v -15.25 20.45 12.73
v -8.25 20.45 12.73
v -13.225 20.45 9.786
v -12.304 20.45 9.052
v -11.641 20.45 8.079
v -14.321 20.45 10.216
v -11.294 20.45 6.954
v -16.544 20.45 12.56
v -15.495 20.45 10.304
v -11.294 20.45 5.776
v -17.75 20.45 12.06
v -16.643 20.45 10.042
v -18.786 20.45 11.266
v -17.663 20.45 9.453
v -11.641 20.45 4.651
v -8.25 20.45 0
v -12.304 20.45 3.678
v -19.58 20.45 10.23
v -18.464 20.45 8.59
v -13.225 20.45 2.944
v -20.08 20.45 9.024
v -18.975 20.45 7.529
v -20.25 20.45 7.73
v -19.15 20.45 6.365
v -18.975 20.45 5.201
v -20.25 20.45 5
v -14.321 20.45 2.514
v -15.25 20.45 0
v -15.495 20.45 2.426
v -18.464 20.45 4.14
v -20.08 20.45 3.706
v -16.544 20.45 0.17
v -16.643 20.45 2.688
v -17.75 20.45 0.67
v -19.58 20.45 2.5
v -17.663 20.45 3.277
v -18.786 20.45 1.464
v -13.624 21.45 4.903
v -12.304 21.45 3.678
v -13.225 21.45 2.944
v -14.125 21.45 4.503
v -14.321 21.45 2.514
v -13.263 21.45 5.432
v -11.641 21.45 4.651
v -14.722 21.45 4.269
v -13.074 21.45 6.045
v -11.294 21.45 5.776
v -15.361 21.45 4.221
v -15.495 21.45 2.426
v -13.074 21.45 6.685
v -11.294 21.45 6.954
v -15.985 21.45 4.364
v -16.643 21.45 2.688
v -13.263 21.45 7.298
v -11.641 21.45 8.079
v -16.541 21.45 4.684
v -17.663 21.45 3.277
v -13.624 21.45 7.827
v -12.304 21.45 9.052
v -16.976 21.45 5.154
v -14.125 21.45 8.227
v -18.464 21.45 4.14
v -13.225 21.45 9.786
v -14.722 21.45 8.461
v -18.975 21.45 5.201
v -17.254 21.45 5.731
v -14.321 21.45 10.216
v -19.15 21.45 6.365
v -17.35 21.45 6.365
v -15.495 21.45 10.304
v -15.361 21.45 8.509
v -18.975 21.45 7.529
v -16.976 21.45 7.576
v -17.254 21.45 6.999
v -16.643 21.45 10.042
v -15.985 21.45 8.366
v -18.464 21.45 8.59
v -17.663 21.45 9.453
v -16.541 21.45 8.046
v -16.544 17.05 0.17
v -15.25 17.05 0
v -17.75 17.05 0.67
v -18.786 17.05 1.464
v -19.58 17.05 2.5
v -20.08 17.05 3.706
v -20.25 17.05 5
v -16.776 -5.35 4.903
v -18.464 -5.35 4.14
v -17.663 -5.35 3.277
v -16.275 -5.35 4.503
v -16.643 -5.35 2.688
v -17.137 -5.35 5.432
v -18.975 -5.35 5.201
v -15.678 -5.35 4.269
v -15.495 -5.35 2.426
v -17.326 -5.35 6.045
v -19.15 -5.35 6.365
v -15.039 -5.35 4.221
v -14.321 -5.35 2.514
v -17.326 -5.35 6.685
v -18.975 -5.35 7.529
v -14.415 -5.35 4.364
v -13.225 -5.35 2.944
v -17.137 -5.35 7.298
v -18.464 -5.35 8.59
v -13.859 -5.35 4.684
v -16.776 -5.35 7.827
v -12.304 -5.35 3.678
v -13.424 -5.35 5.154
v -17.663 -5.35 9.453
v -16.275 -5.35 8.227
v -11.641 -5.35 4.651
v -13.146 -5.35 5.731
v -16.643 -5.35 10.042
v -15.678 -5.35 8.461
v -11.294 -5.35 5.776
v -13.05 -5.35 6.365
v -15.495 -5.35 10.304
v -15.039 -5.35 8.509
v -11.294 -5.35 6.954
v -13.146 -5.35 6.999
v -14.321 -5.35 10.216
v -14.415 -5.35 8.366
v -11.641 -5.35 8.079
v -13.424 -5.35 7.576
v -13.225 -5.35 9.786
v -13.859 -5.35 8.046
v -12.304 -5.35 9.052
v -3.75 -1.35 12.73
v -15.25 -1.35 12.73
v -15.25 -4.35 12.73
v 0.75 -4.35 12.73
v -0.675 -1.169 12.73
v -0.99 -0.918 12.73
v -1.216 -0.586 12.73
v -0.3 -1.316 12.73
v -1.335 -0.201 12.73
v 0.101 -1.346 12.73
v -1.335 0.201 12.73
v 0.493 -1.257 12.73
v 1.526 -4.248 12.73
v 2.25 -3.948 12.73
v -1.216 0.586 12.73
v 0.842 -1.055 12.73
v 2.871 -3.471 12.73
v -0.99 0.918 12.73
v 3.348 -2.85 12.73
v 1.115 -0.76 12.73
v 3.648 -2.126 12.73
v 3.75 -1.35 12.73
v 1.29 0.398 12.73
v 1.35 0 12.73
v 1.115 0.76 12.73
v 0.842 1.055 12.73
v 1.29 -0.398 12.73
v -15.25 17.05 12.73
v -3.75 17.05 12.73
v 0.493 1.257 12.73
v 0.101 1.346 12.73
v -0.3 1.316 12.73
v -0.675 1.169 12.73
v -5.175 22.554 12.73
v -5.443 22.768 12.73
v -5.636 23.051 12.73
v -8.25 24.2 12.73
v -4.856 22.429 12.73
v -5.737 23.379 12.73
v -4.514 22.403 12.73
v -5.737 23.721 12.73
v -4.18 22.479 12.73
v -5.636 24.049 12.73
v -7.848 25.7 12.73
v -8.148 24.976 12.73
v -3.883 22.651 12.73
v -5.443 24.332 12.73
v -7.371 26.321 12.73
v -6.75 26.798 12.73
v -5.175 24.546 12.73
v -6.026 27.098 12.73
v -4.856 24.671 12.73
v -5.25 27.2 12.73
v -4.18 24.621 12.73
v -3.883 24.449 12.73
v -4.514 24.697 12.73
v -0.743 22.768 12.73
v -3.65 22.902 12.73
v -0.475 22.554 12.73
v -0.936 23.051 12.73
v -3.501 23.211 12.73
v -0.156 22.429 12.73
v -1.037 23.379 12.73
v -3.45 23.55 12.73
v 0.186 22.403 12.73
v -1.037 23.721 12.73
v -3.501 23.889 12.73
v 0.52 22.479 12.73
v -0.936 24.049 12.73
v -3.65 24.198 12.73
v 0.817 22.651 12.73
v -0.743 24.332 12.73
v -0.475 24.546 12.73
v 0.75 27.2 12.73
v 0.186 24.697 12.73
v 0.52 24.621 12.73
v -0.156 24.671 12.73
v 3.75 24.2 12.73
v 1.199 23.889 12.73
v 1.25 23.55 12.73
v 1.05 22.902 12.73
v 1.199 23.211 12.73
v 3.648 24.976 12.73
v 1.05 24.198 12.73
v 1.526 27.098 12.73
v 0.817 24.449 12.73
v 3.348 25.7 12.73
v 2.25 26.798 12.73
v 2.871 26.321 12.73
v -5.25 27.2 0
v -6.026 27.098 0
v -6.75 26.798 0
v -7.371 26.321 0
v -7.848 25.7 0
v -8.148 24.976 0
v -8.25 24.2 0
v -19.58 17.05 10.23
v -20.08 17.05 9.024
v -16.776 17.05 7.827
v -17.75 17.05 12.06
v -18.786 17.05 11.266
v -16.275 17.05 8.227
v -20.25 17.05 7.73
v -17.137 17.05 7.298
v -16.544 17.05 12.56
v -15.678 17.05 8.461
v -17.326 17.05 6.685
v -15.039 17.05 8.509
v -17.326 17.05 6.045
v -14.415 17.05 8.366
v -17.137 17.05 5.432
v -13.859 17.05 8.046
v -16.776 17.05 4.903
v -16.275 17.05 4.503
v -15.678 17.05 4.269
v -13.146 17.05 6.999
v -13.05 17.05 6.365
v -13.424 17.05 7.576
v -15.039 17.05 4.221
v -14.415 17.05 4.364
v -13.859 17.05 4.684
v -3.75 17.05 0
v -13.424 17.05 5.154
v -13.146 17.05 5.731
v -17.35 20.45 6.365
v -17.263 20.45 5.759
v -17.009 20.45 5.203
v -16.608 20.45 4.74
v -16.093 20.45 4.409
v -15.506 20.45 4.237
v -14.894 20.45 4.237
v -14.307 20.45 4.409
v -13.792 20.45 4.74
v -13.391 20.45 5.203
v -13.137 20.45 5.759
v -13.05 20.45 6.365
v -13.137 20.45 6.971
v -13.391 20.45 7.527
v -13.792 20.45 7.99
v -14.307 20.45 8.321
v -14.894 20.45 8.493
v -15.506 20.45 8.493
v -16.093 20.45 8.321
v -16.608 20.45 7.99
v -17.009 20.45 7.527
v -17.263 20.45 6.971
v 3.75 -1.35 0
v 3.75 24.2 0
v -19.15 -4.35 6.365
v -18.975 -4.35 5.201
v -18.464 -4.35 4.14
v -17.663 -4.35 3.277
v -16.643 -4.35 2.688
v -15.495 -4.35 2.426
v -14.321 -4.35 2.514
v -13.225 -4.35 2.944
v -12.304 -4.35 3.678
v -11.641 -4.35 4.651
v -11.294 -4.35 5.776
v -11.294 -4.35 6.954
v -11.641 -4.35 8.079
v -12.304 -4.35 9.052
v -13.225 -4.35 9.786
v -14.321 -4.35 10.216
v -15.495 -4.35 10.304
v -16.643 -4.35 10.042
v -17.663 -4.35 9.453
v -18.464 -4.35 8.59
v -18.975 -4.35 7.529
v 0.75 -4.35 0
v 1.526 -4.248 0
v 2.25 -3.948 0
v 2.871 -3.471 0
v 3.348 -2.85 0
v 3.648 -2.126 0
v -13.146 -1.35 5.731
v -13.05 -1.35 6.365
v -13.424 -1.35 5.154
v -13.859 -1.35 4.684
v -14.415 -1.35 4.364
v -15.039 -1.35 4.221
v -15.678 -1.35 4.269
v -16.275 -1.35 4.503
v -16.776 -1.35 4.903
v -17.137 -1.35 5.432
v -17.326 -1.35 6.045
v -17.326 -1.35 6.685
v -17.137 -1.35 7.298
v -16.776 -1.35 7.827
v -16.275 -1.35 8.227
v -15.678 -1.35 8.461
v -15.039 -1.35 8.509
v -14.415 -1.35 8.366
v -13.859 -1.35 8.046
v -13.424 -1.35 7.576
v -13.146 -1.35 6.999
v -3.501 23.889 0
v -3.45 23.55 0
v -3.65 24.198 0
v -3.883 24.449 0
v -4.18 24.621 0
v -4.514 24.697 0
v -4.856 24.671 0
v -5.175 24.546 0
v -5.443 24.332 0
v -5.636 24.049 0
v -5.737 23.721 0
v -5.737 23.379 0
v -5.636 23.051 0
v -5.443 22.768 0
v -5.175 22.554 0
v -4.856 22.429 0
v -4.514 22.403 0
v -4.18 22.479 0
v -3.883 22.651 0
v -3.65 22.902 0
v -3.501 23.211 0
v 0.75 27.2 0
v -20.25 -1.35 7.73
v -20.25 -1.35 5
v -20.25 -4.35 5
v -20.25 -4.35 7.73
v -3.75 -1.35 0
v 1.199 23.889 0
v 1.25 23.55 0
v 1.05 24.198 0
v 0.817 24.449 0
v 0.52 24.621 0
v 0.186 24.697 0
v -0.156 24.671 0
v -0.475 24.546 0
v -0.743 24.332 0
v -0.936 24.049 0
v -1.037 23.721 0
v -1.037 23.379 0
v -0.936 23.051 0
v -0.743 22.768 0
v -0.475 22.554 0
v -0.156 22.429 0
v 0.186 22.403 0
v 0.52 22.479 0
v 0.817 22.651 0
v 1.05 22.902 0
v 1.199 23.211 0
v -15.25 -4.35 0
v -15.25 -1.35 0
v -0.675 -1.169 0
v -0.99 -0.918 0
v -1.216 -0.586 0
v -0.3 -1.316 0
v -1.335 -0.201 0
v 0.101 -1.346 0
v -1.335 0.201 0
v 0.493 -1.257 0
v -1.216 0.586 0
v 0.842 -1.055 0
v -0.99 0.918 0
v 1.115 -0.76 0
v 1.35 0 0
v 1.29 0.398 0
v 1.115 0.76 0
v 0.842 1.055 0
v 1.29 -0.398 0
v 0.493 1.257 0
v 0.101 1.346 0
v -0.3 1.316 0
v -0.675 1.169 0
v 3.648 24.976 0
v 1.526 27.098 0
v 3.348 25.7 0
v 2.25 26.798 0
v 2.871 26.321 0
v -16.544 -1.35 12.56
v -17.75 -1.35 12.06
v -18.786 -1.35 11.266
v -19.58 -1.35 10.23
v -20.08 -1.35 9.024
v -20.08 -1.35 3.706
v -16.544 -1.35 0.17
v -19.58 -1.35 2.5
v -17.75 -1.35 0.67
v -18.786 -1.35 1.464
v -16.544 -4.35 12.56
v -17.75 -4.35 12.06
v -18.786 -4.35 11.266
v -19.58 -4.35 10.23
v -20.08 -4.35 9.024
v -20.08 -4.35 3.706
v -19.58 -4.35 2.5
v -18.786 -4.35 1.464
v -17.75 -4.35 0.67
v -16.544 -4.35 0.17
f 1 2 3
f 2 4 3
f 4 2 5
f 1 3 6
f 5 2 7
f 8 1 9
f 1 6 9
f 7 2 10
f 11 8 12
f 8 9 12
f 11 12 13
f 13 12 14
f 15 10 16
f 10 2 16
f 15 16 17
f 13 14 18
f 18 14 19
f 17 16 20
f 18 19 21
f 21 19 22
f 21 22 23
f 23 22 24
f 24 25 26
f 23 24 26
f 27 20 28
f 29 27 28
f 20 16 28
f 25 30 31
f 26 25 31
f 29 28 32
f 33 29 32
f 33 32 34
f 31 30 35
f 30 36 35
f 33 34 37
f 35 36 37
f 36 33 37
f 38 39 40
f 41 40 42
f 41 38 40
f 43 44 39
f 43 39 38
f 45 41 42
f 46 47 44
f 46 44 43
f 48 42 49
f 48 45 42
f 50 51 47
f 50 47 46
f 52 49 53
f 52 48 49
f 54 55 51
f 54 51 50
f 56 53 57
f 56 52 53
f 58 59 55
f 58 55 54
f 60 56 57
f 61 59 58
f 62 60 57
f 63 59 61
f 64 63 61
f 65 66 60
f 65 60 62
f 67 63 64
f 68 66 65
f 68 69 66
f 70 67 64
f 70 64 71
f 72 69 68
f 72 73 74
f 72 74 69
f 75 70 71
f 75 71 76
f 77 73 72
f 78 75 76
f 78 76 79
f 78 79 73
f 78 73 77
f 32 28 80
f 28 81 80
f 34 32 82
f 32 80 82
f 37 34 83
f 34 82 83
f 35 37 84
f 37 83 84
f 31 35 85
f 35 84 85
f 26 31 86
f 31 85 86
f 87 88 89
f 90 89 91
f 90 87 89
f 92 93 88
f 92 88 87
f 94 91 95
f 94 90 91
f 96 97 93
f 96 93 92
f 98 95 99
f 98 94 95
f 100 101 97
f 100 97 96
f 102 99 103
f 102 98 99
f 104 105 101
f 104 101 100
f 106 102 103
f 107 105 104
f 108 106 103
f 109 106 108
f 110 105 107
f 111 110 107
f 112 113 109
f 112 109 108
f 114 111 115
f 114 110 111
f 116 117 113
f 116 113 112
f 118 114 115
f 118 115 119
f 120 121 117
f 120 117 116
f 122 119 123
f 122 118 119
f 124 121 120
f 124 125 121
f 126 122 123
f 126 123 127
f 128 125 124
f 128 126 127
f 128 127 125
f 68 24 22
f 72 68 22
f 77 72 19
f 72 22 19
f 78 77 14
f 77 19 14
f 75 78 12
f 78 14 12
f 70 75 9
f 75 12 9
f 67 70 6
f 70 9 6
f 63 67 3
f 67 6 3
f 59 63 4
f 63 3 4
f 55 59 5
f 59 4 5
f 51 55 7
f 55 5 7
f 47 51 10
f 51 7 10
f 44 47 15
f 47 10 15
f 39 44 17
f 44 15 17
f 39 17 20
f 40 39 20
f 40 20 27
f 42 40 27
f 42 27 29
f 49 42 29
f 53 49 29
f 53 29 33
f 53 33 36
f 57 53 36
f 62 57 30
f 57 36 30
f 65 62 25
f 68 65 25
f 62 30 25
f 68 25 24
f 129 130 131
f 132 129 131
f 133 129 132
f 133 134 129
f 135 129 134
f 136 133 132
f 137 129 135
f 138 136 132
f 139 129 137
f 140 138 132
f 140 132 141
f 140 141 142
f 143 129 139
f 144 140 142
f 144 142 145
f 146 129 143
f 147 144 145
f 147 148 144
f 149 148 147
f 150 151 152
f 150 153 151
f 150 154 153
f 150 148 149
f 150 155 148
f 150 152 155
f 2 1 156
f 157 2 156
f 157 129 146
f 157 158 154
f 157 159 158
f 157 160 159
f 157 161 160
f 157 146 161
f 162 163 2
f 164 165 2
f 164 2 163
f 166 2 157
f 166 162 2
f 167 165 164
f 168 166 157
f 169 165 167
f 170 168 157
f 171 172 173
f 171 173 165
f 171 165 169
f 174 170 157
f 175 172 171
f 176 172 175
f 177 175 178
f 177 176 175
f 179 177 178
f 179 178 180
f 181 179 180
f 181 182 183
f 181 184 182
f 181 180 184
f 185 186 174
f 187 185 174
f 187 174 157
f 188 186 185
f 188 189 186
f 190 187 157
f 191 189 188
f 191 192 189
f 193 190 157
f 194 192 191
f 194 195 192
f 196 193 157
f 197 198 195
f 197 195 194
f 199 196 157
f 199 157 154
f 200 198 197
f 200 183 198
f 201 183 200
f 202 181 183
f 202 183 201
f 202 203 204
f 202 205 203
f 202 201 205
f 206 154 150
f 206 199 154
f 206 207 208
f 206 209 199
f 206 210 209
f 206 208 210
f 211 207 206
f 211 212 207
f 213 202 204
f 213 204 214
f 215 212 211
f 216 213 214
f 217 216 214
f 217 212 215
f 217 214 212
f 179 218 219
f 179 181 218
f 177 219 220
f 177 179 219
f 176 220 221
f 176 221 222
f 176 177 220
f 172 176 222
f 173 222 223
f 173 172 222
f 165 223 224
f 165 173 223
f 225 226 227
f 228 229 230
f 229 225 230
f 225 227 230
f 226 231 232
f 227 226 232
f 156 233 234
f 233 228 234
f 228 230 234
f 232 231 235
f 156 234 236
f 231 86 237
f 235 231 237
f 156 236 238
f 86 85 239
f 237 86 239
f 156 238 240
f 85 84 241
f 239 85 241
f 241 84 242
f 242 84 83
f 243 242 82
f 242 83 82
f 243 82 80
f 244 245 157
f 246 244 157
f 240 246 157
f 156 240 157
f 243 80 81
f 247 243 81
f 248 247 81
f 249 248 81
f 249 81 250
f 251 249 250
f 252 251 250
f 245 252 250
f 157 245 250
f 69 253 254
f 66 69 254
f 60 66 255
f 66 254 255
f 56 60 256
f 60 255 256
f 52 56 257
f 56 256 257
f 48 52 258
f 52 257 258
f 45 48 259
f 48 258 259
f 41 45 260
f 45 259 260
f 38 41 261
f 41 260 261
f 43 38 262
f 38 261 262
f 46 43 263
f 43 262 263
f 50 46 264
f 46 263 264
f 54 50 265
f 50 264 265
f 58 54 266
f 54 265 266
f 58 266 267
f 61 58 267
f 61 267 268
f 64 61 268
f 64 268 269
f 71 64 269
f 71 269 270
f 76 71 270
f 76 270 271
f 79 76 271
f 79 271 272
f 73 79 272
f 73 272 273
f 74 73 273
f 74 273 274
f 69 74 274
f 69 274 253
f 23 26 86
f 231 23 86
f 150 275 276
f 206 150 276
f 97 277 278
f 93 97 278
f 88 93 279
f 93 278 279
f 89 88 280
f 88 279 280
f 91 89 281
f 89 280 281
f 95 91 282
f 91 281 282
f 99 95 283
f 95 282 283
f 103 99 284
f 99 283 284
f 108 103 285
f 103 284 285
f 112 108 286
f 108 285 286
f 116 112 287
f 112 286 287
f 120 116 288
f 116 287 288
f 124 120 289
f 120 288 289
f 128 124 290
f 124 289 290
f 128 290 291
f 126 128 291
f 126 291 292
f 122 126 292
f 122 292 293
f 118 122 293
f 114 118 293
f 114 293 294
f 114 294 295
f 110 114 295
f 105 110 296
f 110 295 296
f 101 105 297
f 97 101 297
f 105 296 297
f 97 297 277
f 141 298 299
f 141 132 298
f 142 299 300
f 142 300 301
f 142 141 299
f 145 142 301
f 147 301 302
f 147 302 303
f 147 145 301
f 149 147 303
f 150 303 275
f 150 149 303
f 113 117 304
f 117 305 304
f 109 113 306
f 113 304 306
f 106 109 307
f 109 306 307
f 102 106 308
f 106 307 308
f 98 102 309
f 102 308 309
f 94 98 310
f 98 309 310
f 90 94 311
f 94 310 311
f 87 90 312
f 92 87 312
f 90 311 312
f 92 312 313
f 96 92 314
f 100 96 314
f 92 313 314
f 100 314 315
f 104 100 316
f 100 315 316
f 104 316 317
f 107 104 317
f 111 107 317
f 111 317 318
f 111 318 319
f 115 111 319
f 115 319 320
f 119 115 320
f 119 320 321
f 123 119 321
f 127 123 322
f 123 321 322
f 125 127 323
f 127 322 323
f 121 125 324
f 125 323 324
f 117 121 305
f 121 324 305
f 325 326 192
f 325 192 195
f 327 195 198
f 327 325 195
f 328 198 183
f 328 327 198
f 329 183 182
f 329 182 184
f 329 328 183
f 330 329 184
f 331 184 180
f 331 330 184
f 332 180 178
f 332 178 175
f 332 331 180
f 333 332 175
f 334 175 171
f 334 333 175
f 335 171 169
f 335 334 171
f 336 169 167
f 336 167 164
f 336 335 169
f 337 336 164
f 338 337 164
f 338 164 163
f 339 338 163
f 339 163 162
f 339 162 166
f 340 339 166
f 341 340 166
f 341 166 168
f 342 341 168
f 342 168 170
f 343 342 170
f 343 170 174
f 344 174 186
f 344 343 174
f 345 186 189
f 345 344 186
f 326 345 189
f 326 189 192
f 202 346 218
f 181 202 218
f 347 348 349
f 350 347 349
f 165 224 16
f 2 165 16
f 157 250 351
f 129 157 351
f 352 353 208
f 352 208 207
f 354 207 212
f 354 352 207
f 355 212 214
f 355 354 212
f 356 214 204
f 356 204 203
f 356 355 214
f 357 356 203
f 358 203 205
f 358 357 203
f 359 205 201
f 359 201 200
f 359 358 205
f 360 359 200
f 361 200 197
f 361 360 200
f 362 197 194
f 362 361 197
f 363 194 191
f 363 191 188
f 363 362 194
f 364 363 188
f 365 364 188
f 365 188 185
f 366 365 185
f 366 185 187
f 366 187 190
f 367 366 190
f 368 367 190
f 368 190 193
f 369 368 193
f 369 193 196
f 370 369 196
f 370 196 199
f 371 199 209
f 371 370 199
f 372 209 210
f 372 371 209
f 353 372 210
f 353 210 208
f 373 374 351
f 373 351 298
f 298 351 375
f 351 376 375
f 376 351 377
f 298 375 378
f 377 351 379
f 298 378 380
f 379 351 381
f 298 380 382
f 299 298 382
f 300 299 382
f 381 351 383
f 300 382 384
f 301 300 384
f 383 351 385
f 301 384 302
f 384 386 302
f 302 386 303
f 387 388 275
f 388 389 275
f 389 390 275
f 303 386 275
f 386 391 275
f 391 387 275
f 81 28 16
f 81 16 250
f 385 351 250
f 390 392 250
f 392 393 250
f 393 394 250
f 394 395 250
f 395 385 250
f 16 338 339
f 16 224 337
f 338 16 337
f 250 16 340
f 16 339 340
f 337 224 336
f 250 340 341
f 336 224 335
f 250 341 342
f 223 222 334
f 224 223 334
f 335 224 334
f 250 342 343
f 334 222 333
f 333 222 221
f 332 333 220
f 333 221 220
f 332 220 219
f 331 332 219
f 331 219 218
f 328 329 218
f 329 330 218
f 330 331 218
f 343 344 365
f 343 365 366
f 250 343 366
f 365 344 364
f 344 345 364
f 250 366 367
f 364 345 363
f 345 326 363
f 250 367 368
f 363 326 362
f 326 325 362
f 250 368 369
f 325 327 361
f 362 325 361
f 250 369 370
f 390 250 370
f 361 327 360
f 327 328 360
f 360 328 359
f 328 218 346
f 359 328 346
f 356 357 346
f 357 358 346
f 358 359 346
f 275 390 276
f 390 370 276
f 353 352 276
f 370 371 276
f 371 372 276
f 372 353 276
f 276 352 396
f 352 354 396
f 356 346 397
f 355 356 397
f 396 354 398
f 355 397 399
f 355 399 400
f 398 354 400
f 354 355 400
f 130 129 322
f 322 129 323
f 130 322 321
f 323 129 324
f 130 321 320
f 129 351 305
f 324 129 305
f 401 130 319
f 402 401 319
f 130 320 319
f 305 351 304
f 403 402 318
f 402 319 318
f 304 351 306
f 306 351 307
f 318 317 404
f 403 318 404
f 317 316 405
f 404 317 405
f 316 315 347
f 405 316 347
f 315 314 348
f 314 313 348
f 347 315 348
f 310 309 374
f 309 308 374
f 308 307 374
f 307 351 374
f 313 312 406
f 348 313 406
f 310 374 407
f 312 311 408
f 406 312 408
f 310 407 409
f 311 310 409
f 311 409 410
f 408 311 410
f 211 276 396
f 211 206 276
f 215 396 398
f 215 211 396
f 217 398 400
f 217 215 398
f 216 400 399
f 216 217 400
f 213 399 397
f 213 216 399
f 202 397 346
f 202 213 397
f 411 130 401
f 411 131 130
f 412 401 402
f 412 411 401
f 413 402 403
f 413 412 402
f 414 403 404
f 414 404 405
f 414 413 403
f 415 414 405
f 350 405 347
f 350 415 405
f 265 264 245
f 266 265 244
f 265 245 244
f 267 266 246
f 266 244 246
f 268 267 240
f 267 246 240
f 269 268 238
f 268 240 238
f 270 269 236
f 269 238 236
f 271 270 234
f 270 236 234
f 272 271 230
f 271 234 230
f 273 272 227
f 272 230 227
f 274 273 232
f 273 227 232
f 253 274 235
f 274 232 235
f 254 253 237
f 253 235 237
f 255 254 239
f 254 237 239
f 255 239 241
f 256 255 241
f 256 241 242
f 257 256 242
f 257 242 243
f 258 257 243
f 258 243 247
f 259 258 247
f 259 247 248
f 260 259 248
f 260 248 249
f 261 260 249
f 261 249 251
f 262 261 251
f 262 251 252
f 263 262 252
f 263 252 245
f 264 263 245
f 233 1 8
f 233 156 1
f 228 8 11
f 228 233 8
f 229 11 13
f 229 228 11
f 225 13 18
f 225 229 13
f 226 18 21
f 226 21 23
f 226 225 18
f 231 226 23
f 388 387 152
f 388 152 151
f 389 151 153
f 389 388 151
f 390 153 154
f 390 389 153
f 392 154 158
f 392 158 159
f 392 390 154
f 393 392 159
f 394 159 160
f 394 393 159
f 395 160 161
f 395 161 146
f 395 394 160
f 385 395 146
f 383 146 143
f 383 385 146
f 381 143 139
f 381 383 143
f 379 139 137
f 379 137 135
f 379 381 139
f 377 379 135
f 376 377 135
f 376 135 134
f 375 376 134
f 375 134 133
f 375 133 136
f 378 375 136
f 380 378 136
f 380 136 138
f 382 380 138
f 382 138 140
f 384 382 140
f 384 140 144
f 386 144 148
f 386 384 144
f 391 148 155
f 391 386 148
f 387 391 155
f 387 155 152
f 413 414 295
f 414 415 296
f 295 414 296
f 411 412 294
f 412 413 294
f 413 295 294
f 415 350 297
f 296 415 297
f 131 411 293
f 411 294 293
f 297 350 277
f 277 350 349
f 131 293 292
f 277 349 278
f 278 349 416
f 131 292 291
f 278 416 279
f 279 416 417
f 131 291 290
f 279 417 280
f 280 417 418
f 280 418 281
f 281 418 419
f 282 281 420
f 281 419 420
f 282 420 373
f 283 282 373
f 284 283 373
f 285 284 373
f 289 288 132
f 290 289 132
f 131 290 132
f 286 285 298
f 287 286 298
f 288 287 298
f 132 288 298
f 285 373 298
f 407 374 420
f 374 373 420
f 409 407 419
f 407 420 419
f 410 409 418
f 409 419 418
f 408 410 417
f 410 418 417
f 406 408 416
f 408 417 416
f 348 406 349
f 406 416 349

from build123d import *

# Parameters (mm, degrees)
F0_R     = 1.35
F0_R_2   = 1.15
F1_DEPTH = 12.73
F3_DEPTH = 25
F4_R     = 5
F5_R     = 3
F6_R     = 3
F7_DEPTH = 1
F8_R     = 3.95
F9_DEPTH = 1


with BuildPart() as f1:
    # F0 (on Top) → F1 (new body)
    with BuildSketch(Plane.XY):
        Polygon((3.75, -4.35), (3.75, 0), (3.75, 27.2), (-8.25, 27.2), (-8.25, 20.45), (-20.25, 20.45), (-20.25, 17.05), (-3.75, 17.05), (-3.75, -1.35), (-20.25, -1.35), (-20.25, -4.35), align=None)
        Circle(F0_R, mode=Mode.SUBTRACT)
        with Locations((-4.6, 23.55)):
            Circle(F0_R_2, mode=Mode.SUBTRACT)
        with Locations((0.1, 23.55)):
            Circle(F0_R_2, mode=Mode.SUBTRACT)
    extrude(amount=F1_DEPTH)

    # F2 (on face) → F3 (cut)
    with BuildSketch(Plane.XZ.offset(4.35)):
        with BuildLine():
            ThreePointArc((-17.35, 6.365), (-15.2, 4.215), (-13.05, 6.365))
            ThreePointArc((-13.05, 6.365), (-15.2, 8.515), (-17.35, 6.365))
        make_face()
    extrude(amount=-F3_DEPTH, mode=Mode.SUBTRACT)

    # F4
    f4_edges = [f1.edges().sort_by_distance(p)[0] for p in [
        (-20.25, -2.85, 12.73),
        (-20.25, 18.75, 12.73),
        (-20.25, -2.85, 0),
        (-20.25, 18.75, 0),
    ]]
    fillet(f4_edges, radius=F4_R)

    # F5
    f5_edges = [f1.edges().sort_by_distance(p)[0] for p in [
        (3.75, -4.35, 6.365),
    ]]
    fillet(f5_edges, radius=F5_R)

    # F6
    f6_edges = [f1.edges().sort_by_distance(p)[0] for p in [
        (-8.25, 27.2, 6.365),
        (3.75, 27.2, 6.365),
    ]]
    fillet(f6_edges, radius=F6_R)

    # F2 (on face) → F7 (join)
    with BuildSketch(Plane.XZ.offset(4.35)):
        with BuildLine():
            ThreePointArc((-11.25, 6.365), (-15.2, 10.315), (-19.15, 6.365))
            ThreePointArc((-19.15, 6.365), (-15.2, 2.415), (-11.25, 6.365))
        make_face()
        with BuildLine():
            ThreePointArc((-17.35, 6.365), (-15.2, 8.515), (-13.05, 6.365))
            ThreePointArc((-13.05, 6.365), (-15.2, 4.215), (-17.35, 6.365))
        make_face(mode=Mode.SUBTRACT)
    extrude(amount=F7_DEPTH)

    # F8 (on face) → F9 (join)
    with BuildSketch(Plane(origin=(0, 20.45, 0), x_dir=(-1, 0, 0), z_dir=(0, 1, 0))):
        with Locations((15.2, 6.365)):
            Circle(F8_R)
        with BuildLine():
            ThreePointArc((13.05, 6.365), (15.2, 8.515), (17.35, 6.365))
            ThreePointArc((17.35, 6.365), (15.2, 4.215), (13.05, 6.365))
        make_face(mode=Mode.SUBTRACT)
    extrude(amount=F9_DEPTH)


solid = f1.part
